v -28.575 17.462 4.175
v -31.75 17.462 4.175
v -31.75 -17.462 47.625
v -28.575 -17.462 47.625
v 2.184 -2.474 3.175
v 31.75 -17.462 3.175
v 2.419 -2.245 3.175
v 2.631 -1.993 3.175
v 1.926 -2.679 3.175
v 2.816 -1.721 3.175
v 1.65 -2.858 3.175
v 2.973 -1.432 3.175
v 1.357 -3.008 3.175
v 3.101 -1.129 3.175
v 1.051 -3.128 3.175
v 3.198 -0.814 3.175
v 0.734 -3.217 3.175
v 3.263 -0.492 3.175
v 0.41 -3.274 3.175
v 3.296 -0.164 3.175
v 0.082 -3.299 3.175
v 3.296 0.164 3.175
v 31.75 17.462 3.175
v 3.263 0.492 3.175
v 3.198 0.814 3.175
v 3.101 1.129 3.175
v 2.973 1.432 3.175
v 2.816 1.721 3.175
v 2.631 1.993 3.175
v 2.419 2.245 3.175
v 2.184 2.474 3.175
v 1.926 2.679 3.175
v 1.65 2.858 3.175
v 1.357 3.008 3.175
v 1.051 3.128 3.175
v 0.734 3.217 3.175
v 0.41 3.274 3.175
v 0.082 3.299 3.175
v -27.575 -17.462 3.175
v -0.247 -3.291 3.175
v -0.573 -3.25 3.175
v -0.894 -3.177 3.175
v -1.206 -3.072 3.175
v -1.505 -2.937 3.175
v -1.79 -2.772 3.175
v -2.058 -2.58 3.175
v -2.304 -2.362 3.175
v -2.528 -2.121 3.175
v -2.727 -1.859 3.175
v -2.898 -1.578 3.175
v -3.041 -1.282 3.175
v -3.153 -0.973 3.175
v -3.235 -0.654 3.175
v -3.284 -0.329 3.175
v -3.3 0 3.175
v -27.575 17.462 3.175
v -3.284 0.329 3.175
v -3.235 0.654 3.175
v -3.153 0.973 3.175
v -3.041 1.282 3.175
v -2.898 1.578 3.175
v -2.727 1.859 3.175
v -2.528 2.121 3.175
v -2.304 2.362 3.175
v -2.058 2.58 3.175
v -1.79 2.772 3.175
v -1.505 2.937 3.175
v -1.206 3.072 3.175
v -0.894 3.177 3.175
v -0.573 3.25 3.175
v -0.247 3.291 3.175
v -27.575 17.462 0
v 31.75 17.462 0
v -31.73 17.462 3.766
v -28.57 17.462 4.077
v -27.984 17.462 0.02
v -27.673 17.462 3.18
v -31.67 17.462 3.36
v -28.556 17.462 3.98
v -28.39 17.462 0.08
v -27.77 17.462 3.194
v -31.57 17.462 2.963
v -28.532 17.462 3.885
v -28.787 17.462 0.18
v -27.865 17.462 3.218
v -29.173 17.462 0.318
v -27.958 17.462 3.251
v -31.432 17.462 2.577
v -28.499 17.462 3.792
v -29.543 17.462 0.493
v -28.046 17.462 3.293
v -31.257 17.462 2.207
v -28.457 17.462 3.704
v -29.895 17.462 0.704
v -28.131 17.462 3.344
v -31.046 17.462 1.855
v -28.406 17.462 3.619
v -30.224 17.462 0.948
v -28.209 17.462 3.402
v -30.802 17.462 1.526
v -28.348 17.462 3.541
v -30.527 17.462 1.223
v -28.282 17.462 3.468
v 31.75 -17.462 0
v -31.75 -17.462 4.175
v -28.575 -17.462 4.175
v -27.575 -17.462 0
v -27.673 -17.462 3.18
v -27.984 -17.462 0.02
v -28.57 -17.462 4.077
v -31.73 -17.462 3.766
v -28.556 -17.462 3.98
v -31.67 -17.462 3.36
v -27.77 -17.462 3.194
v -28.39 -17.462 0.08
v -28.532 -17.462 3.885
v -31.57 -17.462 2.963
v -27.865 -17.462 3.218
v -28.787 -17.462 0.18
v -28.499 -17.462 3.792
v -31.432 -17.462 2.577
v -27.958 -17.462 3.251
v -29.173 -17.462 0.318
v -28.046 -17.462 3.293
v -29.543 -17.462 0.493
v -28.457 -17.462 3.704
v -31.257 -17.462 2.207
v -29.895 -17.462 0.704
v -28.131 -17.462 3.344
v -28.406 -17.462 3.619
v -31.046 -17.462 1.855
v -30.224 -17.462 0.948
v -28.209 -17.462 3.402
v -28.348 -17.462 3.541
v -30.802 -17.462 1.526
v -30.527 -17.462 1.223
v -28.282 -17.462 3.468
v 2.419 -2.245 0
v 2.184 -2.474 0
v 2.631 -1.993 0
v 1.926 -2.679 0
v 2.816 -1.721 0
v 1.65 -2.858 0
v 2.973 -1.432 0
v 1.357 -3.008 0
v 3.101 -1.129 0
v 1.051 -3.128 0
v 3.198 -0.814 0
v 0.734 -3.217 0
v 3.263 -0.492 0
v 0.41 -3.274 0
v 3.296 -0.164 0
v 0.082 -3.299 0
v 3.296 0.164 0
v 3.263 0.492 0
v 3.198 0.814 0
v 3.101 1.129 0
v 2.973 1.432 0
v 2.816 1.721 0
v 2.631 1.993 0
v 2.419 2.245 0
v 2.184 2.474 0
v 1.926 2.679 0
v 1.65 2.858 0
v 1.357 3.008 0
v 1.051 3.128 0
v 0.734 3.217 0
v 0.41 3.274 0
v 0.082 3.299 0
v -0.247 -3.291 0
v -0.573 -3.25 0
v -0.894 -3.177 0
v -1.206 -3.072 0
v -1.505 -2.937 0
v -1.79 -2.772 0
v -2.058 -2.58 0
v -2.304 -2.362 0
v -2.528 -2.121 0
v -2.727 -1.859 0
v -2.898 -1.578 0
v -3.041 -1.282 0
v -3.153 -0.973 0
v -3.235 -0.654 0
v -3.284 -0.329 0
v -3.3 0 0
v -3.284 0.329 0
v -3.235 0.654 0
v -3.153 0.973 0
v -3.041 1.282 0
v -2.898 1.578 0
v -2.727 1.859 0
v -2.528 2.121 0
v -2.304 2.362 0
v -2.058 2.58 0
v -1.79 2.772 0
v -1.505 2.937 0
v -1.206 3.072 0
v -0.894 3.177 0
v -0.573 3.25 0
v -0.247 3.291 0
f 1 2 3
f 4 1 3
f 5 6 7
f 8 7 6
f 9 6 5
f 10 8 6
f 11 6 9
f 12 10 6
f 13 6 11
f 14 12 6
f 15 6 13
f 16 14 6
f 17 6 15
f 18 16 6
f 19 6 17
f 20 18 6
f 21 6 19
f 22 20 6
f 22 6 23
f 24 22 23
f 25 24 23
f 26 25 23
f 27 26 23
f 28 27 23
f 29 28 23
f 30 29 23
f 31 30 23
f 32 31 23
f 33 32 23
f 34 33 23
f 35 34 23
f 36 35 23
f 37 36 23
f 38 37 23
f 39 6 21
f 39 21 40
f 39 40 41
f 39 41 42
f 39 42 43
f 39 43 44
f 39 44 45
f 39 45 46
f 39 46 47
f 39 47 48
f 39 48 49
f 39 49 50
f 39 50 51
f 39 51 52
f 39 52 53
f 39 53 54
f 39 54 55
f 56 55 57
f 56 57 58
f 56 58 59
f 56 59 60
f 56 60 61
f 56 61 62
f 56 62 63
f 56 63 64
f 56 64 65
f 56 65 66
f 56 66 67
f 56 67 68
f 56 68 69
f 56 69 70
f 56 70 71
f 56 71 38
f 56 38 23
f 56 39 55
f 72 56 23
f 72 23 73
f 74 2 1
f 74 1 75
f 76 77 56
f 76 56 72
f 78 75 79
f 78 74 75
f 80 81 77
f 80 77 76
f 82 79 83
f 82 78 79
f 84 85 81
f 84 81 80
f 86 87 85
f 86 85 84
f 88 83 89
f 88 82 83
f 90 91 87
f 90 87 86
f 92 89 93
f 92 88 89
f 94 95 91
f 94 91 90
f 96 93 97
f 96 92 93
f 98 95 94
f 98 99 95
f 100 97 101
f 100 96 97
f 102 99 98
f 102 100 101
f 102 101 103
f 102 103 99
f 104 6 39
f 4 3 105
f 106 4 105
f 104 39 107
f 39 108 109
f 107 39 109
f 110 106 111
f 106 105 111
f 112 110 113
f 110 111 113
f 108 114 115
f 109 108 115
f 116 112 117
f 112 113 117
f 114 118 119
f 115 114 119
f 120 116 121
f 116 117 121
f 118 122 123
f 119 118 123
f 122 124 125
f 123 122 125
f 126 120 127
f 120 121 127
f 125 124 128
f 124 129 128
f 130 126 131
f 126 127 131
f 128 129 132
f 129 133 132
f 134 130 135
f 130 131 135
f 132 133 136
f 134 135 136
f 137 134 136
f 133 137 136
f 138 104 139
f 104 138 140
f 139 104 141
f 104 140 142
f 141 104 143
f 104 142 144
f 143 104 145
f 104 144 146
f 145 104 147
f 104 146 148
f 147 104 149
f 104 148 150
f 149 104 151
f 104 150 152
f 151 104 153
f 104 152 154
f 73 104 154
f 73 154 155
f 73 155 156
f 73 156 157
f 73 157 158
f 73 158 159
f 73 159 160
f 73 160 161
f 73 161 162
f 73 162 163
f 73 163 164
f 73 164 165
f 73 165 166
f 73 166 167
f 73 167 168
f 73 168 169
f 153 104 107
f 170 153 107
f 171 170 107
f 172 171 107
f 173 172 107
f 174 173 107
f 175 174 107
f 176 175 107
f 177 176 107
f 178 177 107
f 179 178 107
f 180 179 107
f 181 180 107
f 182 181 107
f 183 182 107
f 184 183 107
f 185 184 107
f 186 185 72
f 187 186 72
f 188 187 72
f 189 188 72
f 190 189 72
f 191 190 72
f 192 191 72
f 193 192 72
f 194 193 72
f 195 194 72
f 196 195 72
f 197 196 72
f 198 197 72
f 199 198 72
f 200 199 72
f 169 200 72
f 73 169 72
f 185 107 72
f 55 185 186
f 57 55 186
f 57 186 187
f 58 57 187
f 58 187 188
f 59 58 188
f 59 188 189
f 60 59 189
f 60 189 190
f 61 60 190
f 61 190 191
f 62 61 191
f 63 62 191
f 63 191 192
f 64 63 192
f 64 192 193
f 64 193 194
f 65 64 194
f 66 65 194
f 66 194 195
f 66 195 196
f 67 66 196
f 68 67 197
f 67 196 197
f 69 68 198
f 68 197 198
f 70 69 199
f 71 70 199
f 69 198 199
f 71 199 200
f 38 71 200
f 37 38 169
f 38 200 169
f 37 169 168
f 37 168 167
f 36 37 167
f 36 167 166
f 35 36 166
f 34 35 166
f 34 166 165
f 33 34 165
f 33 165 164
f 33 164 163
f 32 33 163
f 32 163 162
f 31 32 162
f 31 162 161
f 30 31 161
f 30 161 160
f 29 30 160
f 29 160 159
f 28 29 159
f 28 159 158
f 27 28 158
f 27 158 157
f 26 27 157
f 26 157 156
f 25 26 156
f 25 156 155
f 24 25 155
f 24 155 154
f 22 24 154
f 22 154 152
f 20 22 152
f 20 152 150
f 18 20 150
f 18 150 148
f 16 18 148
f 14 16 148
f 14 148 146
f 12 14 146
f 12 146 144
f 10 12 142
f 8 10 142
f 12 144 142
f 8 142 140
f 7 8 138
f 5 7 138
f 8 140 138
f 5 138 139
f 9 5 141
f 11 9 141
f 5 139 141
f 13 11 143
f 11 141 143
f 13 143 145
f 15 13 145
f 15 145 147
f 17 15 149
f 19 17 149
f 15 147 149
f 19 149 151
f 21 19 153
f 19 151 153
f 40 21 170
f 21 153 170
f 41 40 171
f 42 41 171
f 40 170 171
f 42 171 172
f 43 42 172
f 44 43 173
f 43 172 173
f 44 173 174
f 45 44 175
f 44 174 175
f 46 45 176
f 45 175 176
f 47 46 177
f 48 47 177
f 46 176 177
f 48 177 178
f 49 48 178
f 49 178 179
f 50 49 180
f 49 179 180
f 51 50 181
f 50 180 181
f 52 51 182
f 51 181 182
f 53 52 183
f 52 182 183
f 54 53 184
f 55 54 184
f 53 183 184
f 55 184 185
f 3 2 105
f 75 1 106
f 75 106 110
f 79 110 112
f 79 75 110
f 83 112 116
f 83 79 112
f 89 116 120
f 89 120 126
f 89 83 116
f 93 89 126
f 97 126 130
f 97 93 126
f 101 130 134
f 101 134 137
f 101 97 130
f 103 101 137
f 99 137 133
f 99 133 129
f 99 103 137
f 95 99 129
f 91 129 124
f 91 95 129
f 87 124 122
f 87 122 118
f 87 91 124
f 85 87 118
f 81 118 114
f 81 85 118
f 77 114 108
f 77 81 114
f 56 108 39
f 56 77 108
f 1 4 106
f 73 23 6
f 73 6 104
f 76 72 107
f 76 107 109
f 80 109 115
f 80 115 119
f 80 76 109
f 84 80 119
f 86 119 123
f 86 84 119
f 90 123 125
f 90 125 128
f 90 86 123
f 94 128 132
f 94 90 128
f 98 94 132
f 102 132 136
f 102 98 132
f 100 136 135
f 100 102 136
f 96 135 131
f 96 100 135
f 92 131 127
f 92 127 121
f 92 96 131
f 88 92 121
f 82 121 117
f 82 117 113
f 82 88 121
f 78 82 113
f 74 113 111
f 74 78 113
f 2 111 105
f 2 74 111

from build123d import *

# Parameters (mm, degrees)
SKETCH2_W                    = 57.15
SKETCH2_H                    = 34.925
BASE_FLANGE1_DEPTH           = 3.175
M6_CLEARANCE_HOLE1_D         = 6.6
EDGE_FLANGE2_STRIP_W         = 14.7
EDGE_FLANGE2_STRIP_H         = 3.175
EDGE_FLANGE2_STRIP_CUT_DEPTH = 34.925
EDGE_FLANGE2_DEPTH           = 34.925
CUT_EXTRUDE2_DEPTH           = 79.817416579
SKETCH21_W                   = 3.175
SKETCH21_H                   = 34.925
BOSS_EXTRUDE1_DEPTH          = 3.175


# Sheet-metal steps are written as plain solids
with BuildPart() as part:
    # Sketch2 → Base-Flange1 (new body)
    with BuildSketch(Plane.XY):
        Rectangle(SKETCH2_W, SKETCH2_H)
    extrude(amount=BASE_FLANGE1_DEPTH)

    # M6 Clearance Hole1 (through all)
    with Locations(Plane.XY.offset(3.175)):
        with Locations((0, 0)):
            Hole(M6_CLEARANCE_HOLE1_D / 2)

    # Edge-Flange2 strip (across the edge) → Edge-Flange2 strip cut (cut)
    with BuildSketch(Plane(origin=(-28.575, 17.4625, 3.175), x_dir=(1, 0, 0), z_dir=(0, -1, 0))):
        with Locations((-6.35, -1.5875)):
            Rectangle(EDGE_FLANGE2_STRIP_W, EDGE_FLANGE2_STRIP_H)
    extrude(amount=EDGE_FLANGE2_STRIP_CUT_DEPTH, mode=Mode.SUBTRACT)

    # Edge-Flange2 section (across the edge) → Edge-Flange2 (add)
    with BuildSketch(Plane(origin=(-28.575, 17.4625, 3.175), x_dir=(1, 0, 0), z_dir=(0, -1, 0))):
        with BuildLine():
            Line((-3.175, 1), (-3.175, 44.45))
            Line((-3.175, 44.45), (0, 44.45))
            Line((0, 44.45), (0, 1))
            ThreePointArc((0, 1), (0.292893219, 0.292893219), (1, 0))
            Line((1, 0), (1, -3.175))
            ThreePointArc((1, -3.175), (-1.952170811, -1.952170811), (-3.175, 1))
        make_face()
    extrude(amount=EDGE_FLANGE2_DEPTH)

    # Sketch20 → Cut-Extrude2 (cut, through all)
    with BuildSketch(Plane.ZY.offset(31.75)):
        Polygon((4.175, 17.4625), (47.625, -17.4625), (47.625, 17.4625), align=None)
    extrude(amount=-CUT_EXTRUDE2_DEPTH, mode=Mode.SUBTRACT)

    # Sketch21 → Boss-Extrude1 (add)
    with BuildSketch(Plane(origin=(28.575, 0, 0), x_dir=(0, 0, -1), z_dir=(1, 0, 0))):
        with Locations((-1.5875, 0)):
            Rectangle(SKETCH21_W, SKETCH21_H)
    extrude(amount=BOSS_EXTRUDE1_DEPTH)


solid = part.part
